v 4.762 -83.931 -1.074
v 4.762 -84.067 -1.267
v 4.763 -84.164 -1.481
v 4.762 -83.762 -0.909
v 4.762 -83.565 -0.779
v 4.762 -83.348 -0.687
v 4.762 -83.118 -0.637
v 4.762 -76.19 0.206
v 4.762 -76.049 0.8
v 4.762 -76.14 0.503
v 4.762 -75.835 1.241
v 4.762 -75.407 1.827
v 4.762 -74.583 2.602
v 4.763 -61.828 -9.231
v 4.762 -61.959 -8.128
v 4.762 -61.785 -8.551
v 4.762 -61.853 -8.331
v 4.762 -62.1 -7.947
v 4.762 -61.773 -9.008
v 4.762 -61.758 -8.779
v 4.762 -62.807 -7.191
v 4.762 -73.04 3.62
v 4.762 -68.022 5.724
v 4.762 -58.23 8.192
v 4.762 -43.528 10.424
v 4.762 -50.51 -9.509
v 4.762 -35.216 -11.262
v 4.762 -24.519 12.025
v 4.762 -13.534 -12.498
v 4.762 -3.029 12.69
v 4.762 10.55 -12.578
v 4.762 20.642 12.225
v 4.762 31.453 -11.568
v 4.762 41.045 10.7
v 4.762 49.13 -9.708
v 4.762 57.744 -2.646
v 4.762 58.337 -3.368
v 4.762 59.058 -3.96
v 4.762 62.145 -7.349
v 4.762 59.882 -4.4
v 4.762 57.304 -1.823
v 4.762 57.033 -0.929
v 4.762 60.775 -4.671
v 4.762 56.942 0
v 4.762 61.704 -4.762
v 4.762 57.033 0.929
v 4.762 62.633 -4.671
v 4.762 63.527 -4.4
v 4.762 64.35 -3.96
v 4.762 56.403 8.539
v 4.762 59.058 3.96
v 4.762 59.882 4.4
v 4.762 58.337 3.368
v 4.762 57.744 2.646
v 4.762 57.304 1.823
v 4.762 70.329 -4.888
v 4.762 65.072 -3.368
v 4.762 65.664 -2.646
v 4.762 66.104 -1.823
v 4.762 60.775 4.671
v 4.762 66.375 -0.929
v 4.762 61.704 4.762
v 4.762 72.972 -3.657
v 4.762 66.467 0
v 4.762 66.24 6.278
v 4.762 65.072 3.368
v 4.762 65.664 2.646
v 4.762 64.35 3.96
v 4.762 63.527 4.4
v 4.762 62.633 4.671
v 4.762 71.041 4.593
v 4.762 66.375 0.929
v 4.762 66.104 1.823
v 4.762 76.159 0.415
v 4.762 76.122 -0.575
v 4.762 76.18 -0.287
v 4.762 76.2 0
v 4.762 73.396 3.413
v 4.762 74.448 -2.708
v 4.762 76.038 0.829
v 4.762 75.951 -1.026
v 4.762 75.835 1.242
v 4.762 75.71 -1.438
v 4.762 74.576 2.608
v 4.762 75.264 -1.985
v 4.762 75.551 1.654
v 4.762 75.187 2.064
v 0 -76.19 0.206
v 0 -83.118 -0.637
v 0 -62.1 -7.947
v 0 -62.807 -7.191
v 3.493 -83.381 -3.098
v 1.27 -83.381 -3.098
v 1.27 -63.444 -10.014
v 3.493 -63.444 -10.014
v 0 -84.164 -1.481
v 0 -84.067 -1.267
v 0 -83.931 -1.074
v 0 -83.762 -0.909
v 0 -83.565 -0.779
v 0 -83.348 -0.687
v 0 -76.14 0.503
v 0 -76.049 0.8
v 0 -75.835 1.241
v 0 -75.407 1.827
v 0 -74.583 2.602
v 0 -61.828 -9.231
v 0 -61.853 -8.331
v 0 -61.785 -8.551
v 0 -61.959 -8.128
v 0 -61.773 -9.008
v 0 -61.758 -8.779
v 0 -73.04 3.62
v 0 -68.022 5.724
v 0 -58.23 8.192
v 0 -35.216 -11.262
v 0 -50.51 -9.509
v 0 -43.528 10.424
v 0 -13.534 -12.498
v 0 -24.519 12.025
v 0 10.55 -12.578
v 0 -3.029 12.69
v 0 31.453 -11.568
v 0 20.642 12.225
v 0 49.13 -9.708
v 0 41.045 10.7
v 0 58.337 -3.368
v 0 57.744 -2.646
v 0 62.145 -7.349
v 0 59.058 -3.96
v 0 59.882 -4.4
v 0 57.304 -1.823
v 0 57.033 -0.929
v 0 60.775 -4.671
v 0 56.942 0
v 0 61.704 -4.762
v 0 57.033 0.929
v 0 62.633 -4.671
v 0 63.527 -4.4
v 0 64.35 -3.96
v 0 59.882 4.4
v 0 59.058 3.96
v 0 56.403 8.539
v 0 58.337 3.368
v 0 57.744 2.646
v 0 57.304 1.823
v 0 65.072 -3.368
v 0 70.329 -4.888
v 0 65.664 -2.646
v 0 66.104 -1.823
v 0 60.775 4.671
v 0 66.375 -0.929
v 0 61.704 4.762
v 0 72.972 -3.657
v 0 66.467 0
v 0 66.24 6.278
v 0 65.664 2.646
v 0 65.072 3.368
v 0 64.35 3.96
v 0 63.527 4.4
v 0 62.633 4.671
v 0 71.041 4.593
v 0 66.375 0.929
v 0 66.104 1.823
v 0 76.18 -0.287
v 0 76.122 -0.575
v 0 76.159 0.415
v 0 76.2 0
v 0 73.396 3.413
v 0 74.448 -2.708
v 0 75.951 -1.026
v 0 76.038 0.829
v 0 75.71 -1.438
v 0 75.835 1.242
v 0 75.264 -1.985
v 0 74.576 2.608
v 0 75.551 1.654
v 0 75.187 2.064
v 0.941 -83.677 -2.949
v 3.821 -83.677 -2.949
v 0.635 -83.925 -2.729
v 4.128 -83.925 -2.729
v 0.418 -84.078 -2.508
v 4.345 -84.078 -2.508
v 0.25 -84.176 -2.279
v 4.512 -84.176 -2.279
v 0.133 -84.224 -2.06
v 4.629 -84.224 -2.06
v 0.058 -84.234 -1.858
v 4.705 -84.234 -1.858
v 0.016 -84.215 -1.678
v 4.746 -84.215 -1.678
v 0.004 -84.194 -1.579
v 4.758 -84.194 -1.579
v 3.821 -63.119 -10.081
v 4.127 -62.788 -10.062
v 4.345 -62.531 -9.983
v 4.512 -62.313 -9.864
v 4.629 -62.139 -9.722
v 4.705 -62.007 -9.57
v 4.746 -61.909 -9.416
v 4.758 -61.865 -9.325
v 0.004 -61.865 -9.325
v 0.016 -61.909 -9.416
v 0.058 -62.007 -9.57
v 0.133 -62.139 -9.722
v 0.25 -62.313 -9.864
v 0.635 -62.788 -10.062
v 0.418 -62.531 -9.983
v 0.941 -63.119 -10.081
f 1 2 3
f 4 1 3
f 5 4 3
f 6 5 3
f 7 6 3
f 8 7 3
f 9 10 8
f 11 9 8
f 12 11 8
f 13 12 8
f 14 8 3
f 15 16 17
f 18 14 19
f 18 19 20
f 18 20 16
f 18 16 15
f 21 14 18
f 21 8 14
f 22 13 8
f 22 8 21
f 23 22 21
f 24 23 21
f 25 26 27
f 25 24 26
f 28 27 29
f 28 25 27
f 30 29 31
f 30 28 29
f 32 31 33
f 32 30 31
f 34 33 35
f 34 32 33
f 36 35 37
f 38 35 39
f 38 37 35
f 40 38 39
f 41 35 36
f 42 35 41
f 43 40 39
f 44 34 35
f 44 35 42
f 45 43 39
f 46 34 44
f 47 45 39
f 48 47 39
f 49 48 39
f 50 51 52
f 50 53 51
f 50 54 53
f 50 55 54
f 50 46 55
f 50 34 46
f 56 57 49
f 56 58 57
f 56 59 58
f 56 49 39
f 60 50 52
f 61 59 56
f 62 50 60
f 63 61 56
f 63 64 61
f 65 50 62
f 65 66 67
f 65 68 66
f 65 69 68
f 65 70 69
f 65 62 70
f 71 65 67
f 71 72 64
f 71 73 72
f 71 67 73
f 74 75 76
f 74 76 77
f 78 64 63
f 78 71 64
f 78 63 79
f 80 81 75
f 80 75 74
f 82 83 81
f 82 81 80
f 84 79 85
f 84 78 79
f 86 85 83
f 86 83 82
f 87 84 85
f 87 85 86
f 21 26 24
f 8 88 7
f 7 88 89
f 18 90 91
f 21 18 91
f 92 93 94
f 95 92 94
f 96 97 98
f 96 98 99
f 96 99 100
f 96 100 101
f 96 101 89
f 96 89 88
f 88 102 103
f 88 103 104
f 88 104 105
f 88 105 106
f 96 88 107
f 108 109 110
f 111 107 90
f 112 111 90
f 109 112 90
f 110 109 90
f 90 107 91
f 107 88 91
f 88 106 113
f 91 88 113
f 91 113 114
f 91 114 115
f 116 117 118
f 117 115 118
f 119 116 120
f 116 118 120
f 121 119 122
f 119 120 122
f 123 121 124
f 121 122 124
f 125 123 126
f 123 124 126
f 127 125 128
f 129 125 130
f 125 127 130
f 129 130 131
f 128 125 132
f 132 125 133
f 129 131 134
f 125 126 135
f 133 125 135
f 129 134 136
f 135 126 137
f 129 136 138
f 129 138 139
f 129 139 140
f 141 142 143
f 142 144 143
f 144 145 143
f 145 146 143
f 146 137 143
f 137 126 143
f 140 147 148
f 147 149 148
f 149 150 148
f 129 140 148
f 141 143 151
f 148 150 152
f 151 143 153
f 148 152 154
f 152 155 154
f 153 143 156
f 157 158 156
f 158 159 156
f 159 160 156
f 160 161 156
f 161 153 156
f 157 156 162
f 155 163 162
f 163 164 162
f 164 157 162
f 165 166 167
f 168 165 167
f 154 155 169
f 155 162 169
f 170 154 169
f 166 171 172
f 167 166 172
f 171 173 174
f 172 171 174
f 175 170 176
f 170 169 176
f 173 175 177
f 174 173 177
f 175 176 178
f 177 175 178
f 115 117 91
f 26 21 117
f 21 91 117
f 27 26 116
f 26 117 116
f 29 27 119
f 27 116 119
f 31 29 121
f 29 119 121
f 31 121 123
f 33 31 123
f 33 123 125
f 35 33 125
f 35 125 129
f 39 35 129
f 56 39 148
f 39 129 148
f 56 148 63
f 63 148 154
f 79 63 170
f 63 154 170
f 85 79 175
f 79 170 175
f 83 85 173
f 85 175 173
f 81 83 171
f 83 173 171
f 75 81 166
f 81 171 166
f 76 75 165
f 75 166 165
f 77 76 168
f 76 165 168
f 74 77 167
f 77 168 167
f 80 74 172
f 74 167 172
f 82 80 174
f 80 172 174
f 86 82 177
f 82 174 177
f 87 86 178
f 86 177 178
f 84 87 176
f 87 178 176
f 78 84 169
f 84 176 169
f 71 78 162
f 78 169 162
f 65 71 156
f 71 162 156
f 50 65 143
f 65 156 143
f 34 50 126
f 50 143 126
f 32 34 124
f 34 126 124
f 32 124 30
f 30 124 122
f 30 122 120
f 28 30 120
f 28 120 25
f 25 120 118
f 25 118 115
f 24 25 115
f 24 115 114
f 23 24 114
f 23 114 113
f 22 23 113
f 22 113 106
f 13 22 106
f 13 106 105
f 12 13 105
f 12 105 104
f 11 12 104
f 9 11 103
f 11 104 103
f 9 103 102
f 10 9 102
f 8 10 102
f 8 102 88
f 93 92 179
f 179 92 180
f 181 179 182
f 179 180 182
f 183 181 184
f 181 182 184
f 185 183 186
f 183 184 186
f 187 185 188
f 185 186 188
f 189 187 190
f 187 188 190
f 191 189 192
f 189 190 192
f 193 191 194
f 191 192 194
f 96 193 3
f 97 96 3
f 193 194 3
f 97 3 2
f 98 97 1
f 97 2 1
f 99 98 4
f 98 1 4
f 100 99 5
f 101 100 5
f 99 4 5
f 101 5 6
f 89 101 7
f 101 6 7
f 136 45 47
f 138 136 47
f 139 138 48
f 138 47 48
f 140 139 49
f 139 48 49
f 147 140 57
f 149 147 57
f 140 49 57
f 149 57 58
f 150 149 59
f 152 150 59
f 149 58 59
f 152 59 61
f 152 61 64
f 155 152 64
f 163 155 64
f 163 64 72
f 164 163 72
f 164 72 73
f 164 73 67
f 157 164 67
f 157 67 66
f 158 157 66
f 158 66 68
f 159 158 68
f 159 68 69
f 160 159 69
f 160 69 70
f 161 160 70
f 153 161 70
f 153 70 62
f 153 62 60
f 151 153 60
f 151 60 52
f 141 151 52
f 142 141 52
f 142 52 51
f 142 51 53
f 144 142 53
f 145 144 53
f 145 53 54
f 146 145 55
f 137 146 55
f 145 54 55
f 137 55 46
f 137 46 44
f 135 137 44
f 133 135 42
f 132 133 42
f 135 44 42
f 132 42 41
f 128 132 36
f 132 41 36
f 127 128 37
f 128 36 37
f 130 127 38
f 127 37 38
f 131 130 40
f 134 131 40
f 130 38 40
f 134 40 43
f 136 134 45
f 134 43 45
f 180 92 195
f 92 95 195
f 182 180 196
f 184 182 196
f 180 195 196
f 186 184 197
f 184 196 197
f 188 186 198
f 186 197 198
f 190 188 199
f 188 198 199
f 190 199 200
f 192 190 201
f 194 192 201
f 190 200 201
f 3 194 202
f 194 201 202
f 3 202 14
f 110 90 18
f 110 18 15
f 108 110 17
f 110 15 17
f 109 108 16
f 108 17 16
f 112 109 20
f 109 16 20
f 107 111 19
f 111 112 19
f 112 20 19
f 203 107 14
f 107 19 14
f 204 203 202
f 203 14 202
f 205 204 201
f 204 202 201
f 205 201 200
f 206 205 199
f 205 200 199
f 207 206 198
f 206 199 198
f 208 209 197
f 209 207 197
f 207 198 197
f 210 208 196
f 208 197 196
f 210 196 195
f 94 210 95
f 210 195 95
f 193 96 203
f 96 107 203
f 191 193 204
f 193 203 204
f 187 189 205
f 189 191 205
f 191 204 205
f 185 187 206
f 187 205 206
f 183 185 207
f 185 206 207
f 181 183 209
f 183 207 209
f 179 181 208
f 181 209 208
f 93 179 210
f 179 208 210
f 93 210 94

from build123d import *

# Parameters (mm, degrees)
SKETCH1_RX          = 76.2
SKETCH1_RY          = 12.7
BOSS_EXTRUDE1_DEPTH = 4.7625
BOSS_EXTRUDE2_DEPTH = 4.7625
FILLET7_R           = 1.27
SKETCH3_R           = 4.7625
CUT_EXTRUDE1_DEPTH  = 5.7625001


with BuildPart() as part:
    # Sketch1 → Boss-Extrude1 (new body)
    with BuildSketch(Plane(origin=(0, 0, 0), x_dir=(0, 0, -1), z_dir=(1, 0, 0))):
        with Locations(Location((0, 0), (0, 0, 90))):
            Ellipse(SKETCH1_RX, SKETCH1_RY)
    extrude(amount=BOSS_EXTRUDE1_DEPTH)

    # Sketch2 → Boss-Extrude2 (add)
    with BuildSketch(Plane(origin=(0, 0, 0), x_dir=(0, 0, -1), z_dir=(1, 0, 0))):
        Polygon((-0.911321498, -70.388673766), (1.299359703, -88.563738569), (11.69809992, -58.590129834), align=None)
    extrude(amount=BOSS_EXTRUDE2_DEPTH)

    # Fillet7
    fillet7_edges = [part.edges().sort_by_distance(p)[0] for p in [
        (2.38125, -58.590129834, -11.69809992),
        (0, -73.576934201, -6.498729811),
        (2.38125, -88.563738569, -1.299359703),
        (4.7625, -73.576934201, -6.498729811),
    ]]
    fillet(fillet7_edges, radius=FILLET7_R)

    # Sketch3 → Cut-Extrude1 (cut, through all)
    with BuildSketch(Plane(origin=(4.7625, 0, 0), x_dir=(0, 0, -1), z_dir=(1, 0, 0))):
        with Locations((0, 61.704213054)):
            Circle(SKETCH3_R)
    extrude(amount=-CUT_EXTRUDE1_DEPTH, mode=Mode.SUBTRACT)


solid = part.part
